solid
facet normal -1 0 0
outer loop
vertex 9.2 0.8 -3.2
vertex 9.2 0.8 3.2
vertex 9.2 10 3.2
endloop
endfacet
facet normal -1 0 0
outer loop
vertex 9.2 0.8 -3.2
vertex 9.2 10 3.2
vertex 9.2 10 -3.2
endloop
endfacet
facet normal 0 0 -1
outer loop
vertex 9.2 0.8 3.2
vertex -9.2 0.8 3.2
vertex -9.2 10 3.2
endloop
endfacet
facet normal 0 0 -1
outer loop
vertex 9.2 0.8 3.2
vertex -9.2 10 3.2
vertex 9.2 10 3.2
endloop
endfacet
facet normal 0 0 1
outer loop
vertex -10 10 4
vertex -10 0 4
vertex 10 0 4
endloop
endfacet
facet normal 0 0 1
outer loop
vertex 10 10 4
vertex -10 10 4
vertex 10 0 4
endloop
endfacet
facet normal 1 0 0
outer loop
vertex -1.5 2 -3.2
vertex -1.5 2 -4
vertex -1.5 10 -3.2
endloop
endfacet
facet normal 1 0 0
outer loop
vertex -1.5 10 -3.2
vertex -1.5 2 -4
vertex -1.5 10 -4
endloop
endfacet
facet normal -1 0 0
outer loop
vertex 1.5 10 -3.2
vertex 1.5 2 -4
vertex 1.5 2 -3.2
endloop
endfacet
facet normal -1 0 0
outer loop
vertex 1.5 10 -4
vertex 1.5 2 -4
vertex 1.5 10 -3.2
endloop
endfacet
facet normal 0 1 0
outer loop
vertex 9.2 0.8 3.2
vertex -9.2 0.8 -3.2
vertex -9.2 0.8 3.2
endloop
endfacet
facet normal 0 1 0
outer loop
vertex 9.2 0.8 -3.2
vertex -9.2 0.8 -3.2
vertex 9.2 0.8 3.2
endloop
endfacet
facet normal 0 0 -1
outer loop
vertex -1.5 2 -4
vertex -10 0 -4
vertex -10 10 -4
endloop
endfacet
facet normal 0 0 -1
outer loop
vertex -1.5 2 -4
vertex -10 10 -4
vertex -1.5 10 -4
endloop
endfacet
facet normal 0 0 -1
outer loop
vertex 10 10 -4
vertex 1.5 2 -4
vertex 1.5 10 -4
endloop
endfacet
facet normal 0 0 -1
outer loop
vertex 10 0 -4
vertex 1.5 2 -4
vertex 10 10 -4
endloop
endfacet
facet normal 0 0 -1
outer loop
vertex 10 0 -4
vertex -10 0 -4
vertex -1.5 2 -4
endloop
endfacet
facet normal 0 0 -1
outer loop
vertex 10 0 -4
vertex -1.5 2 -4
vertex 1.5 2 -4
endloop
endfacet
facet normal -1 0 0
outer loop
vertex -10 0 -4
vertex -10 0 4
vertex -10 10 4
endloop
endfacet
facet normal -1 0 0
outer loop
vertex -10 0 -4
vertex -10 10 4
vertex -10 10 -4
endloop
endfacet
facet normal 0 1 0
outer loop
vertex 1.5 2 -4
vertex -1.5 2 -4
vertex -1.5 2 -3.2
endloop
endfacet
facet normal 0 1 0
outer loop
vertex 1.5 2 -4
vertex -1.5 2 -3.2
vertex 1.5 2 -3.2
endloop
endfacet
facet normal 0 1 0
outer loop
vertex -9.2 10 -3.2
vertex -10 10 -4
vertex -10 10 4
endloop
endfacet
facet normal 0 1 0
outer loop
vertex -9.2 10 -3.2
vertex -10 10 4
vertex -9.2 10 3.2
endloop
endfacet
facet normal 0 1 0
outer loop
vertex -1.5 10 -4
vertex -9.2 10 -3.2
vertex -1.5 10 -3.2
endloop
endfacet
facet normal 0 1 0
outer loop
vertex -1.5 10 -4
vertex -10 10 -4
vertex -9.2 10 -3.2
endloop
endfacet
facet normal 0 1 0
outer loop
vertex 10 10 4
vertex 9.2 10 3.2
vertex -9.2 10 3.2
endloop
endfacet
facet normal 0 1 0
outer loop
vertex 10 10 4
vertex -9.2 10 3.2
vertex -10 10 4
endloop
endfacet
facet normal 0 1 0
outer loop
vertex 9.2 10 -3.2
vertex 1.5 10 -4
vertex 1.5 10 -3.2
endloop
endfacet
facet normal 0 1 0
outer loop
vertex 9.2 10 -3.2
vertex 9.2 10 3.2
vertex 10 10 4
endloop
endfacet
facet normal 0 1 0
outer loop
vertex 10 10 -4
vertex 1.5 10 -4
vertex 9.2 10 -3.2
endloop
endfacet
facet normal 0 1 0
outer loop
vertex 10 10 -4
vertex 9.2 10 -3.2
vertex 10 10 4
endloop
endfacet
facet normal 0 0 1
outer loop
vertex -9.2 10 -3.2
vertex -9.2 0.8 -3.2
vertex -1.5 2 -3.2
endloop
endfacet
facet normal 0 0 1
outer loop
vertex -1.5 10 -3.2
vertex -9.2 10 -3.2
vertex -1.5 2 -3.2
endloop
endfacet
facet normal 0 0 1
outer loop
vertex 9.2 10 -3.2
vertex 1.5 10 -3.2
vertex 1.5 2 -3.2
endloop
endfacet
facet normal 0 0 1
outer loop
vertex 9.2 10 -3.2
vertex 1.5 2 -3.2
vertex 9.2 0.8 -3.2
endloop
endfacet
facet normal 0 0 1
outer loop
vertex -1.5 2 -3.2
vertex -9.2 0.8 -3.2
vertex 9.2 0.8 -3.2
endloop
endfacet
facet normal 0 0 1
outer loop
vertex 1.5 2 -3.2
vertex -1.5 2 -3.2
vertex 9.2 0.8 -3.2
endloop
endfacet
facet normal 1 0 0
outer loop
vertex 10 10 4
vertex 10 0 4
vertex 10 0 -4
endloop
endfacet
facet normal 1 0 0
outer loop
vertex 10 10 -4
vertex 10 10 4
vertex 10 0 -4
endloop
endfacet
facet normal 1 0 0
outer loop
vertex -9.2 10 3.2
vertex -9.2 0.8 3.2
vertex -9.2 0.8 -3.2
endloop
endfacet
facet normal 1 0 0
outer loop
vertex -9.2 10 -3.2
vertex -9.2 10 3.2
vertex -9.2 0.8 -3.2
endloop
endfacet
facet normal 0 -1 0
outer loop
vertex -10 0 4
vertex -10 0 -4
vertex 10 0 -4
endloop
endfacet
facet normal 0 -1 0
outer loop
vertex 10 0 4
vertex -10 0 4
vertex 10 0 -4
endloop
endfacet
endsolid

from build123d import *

# Parameters (mm, degrees)
SKETCH1_W           = 20
SKETCH1_H           = 8
SKETCH1_W_2         = 18.4
SKETCH1_H_2         = 6.4
BOSS_EXTRUDE1_DEPTH = 10
SKETCH3_W           = 18.4
SKETCH3_H           = 6.4
BOSS_EXTRUDE2_DEPTH = 0.8
CUT_EXTRUDE1_REACH  = 10
SKETCH2_W           = 3
SKETCH2_H           = 8


with BuildPart() as part:
    # Sketch1 → Boss-Extrude1 (new body)
    with BuildSketch(Plane(origin=(0, 0, 0), x_dir=(1, 0, 0), z_dir=(0, 1, 0))):
        Rectangle(SKETCH1_W, SKETCH1_H)
        Rectangle(SKETCH1_W_2, SKETCH1_H_2, mode=Mode.SUBTRACT)
    extrude(amount=BOSS_EXTRUDE1_DEPTH)

    # Sketch3 → Boss-Extrude2 (add)
    with BuildSketch(Plane(origin=(0, 0, 0), x_dir=(1, 0, 0), z_dir=(0, 1, 0))):
        Rectangle(SKETCH3_W, SKETCH3_H)
    extrude(amount=BOSS_EXTRUDE2_DEPTH)

    # Sketch2 → Cut-Extrude1 (cut, up to next)
    with BuildSketch(Plane.XY.offset(-4), mode=Mode.PRIVATE) as cut_extrude1_sk1:
        with Locations((0, 6)):
            Rectangle(SKETCH2_W, SKETCH2_H)
    cut_extrude1_tool1 = extrude(cut_extrude1_sk1.sketch, amount=CUT_EXTRUDE1_REACH, mode=Mode.PRIVATE) & part.part
    add(cut_extrude1_tool1.solids().sort_by_distance((0, 6, -4))[0], mode=Mode.SUBTRACT)


solid = part.part
